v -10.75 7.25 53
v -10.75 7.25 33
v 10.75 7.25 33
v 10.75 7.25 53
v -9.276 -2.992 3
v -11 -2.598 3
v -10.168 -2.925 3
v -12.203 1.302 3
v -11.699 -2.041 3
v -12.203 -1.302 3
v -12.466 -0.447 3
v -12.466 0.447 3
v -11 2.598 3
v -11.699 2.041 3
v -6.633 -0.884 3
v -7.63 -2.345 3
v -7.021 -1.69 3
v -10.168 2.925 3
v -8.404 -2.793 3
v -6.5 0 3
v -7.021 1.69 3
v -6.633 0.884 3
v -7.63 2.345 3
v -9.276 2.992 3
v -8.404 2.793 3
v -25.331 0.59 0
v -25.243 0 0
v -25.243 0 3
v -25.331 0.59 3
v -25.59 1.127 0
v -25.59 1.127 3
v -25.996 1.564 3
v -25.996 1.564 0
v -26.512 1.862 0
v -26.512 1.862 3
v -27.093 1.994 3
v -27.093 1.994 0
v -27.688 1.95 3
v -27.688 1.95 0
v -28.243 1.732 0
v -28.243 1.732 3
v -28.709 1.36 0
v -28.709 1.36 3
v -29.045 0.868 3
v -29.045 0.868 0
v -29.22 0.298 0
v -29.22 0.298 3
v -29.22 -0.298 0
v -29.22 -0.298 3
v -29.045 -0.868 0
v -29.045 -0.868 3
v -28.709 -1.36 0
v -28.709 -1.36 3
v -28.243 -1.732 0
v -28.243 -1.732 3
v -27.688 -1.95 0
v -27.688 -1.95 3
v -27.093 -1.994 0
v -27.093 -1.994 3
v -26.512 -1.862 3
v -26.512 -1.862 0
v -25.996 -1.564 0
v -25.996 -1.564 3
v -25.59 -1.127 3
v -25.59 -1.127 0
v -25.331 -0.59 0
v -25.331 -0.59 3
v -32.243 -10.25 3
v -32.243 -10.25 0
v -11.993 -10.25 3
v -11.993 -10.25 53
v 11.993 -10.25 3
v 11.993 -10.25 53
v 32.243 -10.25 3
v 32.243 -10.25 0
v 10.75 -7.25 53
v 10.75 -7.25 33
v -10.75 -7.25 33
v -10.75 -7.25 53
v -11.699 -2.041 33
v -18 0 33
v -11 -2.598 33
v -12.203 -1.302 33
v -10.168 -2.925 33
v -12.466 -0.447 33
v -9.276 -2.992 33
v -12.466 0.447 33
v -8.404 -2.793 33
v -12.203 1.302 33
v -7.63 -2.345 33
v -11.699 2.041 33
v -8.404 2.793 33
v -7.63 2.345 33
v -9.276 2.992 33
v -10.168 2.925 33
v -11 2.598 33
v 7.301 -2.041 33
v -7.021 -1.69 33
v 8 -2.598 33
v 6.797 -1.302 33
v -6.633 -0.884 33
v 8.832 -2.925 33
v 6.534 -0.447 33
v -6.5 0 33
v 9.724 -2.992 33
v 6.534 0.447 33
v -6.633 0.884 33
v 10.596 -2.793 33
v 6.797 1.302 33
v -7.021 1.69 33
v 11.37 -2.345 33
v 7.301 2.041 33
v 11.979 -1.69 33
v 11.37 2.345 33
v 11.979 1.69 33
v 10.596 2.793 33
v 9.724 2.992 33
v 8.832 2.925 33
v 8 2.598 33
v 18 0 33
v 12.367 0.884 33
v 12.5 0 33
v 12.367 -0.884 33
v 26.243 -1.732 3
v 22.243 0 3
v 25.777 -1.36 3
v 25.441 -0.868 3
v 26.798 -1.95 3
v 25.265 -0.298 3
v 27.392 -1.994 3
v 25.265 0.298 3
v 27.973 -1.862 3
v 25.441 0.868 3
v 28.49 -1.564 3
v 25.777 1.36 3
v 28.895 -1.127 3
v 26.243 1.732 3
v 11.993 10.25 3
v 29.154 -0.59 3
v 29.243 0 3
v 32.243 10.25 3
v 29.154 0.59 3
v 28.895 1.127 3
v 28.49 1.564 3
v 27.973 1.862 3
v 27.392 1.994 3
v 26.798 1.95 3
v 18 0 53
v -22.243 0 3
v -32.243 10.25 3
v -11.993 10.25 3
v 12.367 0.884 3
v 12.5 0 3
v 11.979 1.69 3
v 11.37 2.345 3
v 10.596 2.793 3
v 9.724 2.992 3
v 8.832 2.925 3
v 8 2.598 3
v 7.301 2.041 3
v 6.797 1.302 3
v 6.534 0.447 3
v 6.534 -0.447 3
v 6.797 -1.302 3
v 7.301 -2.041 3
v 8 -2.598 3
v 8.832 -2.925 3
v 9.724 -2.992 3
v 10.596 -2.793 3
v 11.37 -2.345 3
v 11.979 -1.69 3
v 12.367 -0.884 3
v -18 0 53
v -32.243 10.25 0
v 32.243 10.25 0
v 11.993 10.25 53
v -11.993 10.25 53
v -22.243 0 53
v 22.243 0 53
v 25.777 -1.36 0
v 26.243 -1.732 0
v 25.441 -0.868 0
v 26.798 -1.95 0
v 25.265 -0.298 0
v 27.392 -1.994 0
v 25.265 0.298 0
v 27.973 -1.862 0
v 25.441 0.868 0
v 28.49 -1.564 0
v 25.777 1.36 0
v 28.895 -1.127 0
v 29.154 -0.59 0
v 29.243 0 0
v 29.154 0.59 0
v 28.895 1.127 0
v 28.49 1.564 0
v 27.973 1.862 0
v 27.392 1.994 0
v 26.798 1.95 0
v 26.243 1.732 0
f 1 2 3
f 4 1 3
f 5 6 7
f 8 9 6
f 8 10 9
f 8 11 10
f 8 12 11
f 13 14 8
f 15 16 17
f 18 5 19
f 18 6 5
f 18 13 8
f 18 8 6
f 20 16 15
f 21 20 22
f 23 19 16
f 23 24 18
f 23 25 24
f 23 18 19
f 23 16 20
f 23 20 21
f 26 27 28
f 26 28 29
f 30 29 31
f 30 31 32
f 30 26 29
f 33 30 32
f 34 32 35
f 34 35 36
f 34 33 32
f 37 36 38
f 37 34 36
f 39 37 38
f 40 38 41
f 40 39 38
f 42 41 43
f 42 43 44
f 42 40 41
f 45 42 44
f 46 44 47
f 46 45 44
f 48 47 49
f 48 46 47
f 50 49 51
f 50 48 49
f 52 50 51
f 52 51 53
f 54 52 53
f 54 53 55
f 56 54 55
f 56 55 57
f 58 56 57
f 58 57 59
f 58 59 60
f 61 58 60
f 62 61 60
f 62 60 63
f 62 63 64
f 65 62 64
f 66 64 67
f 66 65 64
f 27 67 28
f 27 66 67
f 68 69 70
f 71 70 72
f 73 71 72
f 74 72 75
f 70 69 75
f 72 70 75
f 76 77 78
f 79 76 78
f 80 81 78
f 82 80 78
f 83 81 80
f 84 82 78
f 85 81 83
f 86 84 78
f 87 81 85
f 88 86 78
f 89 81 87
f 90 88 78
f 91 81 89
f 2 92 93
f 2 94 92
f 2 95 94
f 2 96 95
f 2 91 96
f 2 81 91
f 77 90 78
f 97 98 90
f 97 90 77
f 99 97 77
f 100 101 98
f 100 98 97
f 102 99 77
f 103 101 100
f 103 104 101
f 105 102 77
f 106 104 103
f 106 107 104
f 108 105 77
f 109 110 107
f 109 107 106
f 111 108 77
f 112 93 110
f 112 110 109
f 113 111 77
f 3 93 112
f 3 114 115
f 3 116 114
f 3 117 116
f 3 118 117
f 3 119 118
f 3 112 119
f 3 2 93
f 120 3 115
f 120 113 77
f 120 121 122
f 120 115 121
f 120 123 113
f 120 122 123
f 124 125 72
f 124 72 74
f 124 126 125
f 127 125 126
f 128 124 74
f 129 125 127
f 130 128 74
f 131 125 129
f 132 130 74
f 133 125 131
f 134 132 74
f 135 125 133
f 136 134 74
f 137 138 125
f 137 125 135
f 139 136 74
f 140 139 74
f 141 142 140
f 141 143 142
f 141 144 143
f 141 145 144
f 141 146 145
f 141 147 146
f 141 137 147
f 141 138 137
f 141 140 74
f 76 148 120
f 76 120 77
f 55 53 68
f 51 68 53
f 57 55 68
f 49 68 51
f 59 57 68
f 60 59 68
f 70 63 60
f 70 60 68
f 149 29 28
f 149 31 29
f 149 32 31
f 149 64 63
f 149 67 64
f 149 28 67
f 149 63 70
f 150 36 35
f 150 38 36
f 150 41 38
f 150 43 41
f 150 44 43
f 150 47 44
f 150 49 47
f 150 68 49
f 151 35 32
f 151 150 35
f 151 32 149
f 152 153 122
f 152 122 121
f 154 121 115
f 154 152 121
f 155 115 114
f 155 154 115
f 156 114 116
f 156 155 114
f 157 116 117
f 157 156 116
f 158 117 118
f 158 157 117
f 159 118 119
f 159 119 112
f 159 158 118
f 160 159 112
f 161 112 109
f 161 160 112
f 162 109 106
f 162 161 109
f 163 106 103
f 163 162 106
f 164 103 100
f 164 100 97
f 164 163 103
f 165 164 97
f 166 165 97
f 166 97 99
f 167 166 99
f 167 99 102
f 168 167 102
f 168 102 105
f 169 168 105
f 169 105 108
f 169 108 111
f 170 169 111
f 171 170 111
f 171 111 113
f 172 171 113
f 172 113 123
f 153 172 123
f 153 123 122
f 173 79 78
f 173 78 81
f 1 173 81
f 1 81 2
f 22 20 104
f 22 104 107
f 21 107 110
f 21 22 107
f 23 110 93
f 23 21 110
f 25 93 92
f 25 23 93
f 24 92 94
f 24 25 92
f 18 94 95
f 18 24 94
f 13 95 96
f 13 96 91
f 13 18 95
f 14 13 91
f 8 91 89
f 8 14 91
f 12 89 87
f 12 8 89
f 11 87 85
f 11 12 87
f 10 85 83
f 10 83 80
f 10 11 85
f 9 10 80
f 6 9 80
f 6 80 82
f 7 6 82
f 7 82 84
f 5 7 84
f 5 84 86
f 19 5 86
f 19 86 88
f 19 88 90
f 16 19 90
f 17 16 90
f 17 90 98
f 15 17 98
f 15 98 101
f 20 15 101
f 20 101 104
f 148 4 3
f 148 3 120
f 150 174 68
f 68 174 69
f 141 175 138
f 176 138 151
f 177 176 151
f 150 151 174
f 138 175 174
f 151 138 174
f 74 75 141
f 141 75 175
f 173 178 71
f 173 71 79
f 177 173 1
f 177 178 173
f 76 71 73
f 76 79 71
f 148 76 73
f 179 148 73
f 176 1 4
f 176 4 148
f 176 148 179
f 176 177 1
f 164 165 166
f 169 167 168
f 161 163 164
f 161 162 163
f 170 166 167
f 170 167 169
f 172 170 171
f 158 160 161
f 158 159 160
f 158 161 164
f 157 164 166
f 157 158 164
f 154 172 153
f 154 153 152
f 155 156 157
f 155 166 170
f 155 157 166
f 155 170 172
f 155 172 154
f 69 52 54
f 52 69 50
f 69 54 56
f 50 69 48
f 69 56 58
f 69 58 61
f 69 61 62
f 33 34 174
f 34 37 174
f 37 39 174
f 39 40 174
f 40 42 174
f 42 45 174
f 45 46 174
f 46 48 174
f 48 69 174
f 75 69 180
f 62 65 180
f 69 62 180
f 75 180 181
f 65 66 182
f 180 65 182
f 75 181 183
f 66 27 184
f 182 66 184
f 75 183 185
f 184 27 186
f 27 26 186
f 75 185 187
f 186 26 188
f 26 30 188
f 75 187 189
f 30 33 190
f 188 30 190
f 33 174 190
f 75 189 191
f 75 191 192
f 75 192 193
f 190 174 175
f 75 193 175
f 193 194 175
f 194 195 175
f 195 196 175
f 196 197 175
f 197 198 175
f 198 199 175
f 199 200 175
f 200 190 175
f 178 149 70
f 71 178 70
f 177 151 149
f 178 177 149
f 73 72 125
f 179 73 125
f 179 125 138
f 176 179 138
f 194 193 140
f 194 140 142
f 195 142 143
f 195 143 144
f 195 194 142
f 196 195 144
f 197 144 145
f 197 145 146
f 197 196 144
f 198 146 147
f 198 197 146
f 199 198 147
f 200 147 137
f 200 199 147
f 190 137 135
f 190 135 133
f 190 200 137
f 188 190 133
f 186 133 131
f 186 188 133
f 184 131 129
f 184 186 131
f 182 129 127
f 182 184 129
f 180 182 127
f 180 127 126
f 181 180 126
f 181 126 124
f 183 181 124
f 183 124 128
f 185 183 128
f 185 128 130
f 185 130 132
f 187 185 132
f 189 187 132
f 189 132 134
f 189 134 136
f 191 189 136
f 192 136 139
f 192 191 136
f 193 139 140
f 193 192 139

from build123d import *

# Parameters (mm, degrees)
F0_R     = 3
F0_R_2   = 2
F1_DEPTH = 3
F2_DEPTH = 53
F3_DEPTH = 33


with BuildPart() as f1:
    # F0 (on Top) → F1 (new body)
    with BuildSketch(Plane.XY):
        Polygon((-11.9926406871, 10.25), (-22.2426406871, 0), (-11.9926406871, -10.25), (11.9926406871, -10.25), (22.2426406871, 0), (11.9926406871, 10.25), align=None)
        Polygon((-18, 0), (-10.75, 7.25), (10.75, 7.25), (18, 0), (10.75, -7.25), (-10.75, -7.25), align=None, mode=Mode.SUBTRACT)
        Polygon((10.75, 7.25), (-10.75, 7.25), (-18, 0), (-10.75, -7.25), (10.75, -7.25), (18, 0), align=None)
        with Locations((-9.5, 0)):
            Circle(F0_R, mode=Mode.SUBTRACT)
        with Locations((9.5, 0)):
            Circle(F0_R, mode=Mode.SUBTRACT)
        Polygon((32.2426406871, 10.25), (11.9926406871, 10.25), (22.2426406871, 0), (11.9926406871, -10.25), (32.2426406871, -10.25), align=None)
        with Locations((27.2426406871, 0)):
            Circle(F0_R_2, mode=Mode.SUBTRACT)
        Polygon((-11.9926406871, -10.25), (-22.2426406871, 0), (-11.9926406871, 10.25), (-32.2426406871, 10.25), (-32.2426406871, -10.25), align=None)
        with Locations((-27.2426406871, 0)):
            Circle(F0_R_2, mode=Mode.SUBTRACT)
        with Locations((-9.5, 0)):
            Circle(F0_R)
        with Locations((9.5, 0)):
            Circle(F0_R)
    extrude(amount=F1_DEPTH)

    # F0 (on Top) → F2 (join)
    with BuildSketch(Plane.XY):
        Polygon((-11.9926406871, 10.25), (-22.2426406871, 0), (-11.9926406871, -10.25), (11.9926406871, -10.25), (22.2426406871, 0), (11.9926406871, 10.25), align=None)
        Polygon((-18, 0), (-10.75, 7.25), (10.75, 7.25), (18, 0), (10.75, -7.25), (-10.75, -7.25), align=None, mode=Mode.SUBTRACT)
    extrude(amount=F2_DEPTH)

    # F0 (on Top) → F3 (join)
    with BuildSketch(Plane.XY):
        Polygon((10.75, 7.25), (-10.75, 7.25), (-18, 0), (-10.75, -7.25), (10.75, -7.25), (18, 0), align=None)
        with Locations((-9.5, 0)):
            Circle(F0_R, mode=Mode.SUBTRACT)
        with Locations((9.5, 0)):
            Circle(F0_R, mode=Mode.SUBTRACT)
    extrude(amount=F3_DEPTH)


solid = f1.part
